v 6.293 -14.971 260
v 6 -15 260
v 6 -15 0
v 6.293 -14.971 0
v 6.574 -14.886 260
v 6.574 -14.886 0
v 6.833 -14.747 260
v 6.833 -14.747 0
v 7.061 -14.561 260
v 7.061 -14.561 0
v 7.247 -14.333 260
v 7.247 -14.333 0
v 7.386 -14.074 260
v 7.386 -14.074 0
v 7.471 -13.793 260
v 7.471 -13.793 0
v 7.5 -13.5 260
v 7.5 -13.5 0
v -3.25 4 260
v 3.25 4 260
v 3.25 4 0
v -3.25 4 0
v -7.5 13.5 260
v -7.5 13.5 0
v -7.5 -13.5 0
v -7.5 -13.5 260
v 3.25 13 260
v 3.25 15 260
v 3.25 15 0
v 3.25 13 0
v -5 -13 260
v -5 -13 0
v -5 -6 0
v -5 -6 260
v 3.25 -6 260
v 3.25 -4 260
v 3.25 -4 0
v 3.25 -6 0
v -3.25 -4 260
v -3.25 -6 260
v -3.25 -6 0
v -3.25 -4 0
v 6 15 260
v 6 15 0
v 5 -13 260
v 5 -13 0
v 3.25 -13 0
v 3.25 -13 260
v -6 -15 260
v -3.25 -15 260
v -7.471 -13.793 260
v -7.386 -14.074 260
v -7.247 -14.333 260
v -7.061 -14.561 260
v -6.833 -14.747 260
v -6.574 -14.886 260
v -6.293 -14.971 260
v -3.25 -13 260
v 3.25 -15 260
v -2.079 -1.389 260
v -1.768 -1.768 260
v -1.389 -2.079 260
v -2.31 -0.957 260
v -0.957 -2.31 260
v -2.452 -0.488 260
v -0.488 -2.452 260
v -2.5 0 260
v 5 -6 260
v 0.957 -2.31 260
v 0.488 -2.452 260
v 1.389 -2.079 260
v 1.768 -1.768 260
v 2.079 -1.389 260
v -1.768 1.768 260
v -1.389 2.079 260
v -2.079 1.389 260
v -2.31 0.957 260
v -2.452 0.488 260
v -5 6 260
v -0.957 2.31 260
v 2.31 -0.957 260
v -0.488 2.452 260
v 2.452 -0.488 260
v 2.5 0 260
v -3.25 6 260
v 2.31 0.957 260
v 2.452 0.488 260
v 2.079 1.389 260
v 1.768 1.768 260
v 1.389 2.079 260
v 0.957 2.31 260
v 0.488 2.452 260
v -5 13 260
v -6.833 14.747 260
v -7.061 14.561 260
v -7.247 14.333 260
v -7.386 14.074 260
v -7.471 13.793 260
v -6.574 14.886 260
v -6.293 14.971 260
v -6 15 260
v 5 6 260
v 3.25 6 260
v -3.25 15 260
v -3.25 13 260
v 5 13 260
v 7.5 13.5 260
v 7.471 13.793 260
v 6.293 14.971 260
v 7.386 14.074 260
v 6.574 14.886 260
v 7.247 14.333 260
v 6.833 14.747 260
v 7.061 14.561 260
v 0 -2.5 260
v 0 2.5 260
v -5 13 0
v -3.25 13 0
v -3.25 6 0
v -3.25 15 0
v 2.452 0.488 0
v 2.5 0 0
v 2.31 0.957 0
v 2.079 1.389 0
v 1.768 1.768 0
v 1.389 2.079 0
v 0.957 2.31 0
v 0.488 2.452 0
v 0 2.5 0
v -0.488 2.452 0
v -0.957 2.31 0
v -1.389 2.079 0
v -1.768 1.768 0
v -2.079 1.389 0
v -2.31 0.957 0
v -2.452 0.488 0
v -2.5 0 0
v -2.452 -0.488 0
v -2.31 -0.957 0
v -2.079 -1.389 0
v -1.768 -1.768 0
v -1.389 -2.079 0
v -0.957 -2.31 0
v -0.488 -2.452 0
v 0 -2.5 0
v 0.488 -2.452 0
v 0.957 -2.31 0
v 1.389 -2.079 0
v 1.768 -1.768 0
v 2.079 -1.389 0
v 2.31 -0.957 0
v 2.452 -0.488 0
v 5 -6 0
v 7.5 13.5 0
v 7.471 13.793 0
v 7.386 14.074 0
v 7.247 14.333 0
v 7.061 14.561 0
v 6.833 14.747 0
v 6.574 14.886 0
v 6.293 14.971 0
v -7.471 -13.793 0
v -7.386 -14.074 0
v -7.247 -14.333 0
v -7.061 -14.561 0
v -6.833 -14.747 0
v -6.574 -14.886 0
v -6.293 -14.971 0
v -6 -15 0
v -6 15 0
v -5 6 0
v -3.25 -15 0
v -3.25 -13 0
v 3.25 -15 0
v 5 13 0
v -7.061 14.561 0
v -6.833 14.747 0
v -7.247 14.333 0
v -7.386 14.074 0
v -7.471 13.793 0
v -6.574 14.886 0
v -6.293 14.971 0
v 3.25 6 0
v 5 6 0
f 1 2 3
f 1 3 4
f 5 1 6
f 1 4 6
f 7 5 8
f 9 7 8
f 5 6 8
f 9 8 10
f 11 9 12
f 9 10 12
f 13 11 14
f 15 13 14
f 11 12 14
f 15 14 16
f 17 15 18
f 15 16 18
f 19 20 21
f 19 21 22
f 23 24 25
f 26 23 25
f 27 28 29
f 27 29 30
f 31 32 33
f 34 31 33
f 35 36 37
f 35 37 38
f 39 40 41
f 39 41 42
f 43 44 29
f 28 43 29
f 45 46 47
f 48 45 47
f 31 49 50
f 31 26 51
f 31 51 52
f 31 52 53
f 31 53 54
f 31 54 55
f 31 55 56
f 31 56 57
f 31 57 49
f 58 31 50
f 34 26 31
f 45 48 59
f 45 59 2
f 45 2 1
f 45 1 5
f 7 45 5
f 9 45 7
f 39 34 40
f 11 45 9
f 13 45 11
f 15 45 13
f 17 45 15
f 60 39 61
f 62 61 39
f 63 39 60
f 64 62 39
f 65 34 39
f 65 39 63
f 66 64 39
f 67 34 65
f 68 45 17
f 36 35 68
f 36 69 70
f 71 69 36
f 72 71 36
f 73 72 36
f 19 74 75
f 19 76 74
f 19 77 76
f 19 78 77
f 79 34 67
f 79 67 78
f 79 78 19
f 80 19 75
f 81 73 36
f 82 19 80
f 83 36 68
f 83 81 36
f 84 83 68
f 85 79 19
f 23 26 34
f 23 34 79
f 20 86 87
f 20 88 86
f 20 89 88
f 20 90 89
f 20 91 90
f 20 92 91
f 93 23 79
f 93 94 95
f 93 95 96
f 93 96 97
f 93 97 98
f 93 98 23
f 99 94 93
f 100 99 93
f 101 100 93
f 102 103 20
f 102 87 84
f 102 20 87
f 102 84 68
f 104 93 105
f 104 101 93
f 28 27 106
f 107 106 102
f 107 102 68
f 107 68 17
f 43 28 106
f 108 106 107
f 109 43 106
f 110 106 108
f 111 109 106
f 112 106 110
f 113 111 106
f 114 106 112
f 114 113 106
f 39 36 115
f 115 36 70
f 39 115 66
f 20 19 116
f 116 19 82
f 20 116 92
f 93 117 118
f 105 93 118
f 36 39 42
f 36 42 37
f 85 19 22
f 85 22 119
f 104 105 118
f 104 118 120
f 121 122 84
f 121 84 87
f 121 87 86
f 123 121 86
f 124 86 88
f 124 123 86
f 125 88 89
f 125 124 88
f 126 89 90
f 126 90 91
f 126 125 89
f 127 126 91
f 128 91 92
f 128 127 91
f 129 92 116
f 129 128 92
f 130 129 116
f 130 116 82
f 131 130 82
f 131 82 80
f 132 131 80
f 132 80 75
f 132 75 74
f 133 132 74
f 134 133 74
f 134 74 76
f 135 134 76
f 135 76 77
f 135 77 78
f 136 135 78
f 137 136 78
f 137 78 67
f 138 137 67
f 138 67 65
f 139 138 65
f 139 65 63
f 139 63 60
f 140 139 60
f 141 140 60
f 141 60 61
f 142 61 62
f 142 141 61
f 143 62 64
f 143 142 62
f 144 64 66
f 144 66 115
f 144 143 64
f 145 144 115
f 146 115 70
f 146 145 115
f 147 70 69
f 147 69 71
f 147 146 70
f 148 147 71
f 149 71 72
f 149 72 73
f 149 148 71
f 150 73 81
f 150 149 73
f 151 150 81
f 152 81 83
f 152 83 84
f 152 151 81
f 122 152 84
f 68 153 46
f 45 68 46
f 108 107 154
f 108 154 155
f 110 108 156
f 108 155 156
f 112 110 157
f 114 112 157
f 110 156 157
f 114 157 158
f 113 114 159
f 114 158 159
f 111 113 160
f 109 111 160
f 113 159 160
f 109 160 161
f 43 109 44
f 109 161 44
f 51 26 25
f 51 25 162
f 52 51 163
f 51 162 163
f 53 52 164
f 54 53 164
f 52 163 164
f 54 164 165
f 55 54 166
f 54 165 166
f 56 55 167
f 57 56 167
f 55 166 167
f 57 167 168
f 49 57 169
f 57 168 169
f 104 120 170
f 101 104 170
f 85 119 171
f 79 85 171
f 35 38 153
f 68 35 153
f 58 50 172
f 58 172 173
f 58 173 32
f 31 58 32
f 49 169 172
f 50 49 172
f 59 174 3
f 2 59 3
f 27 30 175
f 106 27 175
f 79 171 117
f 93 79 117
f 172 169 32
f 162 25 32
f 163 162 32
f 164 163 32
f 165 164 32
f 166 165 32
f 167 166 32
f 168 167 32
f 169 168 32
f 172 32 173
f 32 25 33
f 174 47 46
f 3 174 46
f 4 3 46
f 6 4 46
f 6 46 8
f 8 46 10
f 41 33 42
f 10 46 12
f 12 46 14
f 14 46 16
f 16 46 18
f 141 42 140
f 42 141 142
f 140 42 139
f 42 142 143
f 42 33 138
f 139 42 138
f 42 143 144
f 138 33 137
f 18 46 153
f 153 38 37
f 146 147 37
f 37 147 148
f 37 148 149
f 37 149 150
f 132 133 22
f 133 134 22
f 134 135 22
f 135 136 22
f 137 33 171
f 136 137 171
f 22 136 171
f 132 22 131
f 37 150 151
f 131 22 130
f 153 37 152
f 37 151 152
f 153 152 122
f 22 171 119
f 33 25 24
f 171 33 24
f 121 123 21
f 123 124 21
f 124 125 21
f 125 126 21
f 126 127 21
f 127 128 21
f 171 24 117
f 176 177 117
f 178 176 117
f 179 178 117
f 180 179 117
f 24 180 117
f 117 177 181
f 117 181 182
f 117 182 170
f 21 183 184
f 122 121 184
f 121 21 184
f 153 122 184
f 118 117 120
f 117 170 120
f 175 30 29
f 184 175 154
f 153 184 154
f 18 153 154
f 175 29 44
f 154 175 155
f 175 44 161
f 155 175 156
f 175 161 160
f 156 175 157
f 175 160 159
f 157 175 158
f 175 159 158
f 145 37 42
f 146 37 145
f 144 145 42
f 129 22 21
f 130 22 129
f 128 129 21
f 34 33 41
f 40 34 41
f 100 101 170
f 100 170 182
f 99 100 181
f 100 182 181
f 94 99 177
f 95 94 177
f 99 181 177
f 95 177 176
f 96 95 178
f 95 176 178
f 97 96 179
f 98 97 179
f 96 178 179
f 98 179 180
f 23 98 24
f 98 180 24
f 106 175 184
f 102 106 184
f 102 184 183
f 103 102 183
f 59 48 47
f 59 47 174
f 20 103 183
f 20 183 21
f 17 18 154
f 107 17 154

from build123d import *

# Parameters (mm, degrees)
SKETCH1_R              = 2.5
EXTRUDE_1_DEPTH        = 260
HOLE_WIZARD_M6_1_D     = 5
HOLE_WIZARD_M6_1_DEPTH = 20
HOLE_WIZARD_M6_1_TIP   = 1.502151548
HOLE_WIZARD_M6_2_D     = 5
HOLE_WIZARD_M6_2_DEPTH = 20
HOLE_WIZARD_M6_2_TIP   = 1.502151548


with BuildPart() as part:
    # Sketch1 → 凸台-拉伸1 (new body)
    with BuildSketch(Plane.XY):
        with BuildLine():
            Line((-6, -15), (-3.25, -15))
            Line((-3.25, -15), (-3.25, -13))
            Line((-3.25, -13), (-5, -13))
            Line((-5, -13), (-5, -6))
            Line((-5, -6), (-3.25, -6))
            Line((-3.25, -6), (-3.25, -4))
            Line((-3.25, -4), (3.25, -4))
            Line((3.25, -4), (3.25, -6))
            Line((3.25, -6), (5, -6))
            Line((5, -6), (5, -13))
            Line((5, -13), (3.25, -13))
            Line((3.25, -13), (3.25, -15))
            Line((3.25, -15), (6, -15))
            ThreePointArc((6, -15), (7.060660172, -14.560660172), (7.5, -13.5))
            Line((7.5, -13.5), (7.5, 13.5))
            ThreePointArc((7.5, 13.5), (7.060660172, 14.560660172), (6, 15))
            Line((6, 15), (3.25, 15))
            Line((3.25, 15), (3.25, 13))
            Line((3.25, 13), (5, 13))
            Line((5, 13), (5, 6))
            Line((5, 6), (3.25, 6))
            Line((3.25, 6), (3.25, 4))
            Line((3.25, 4), (-3.25, 4))
            Line((-3.25, 4), (-3.25, 6))
            Line((-3.25, 6), (-5, 6))
            Line((-5, 6), (-5, 13))
            Line((-5, 13), (-3.25, 13))
            Line((-3.25, 13), (-3.25, 15))
            Line((-3.25, 15), (-6, 15))
            ThreePointArc((-6, 15), (-7.060660172, 14.560660172), (-7.5, 13.5))
            Line((-7.5, 13.5), (-7.5, -13.5))
            ThreePointArc((-7.5, -13.5), (-7.060660172, -14.560660172), (-6, -15))
        make_face()
        Circle(SKETCH1_R, mode=Mode.SUBTRACT)
    extrude(amount=EXTRUDE_1_DEPTH)

    # M6 螺纹孔1
    with Locations(Plane.XY.offset(260)):
        with Locations((0, 0)):
            Hole(HOLE_WIZARD_M6_1_D / 2, depth=HOLE_WIZARD_M6_1_DEPTH)
            with Locations((0, 0, -(HOLE_WIZARD_M6_1_DEPTH + HOLE_WIZARD_M6_1_TIP / 2))):  # 118° drill point
                Cone(0, HOLE_WIZARD_M6_1_D / 2, HOLE_WIZARD_M6_1_TIP, mode=Mode.SUBTRACT)

    # M6 螺纹孔2
    with Locations(Plane(origin=(0, 0, 0), x_dir=(-1, 0, 0), z_dir=(0, 0, -1))):
        with Locations((0, 0)):
            Hole(HOLE_WIZARD_M6_2_D / 2, depth=HOLE_WIZARD_M6_2_DEPTH)
            with Locations((0, 0, -(HOLE_WIZARD_M6_2_DEPTH + HOLE_WIZARD_M6_2_TIP / 2))):  # 118° drill point
                Cone(0, HOLE_WIZARD_M6_2_D / 2, HOLE_WIZARD_M6_2_TIP, mode=Mode.SUBTRACT)


solid = part.part
